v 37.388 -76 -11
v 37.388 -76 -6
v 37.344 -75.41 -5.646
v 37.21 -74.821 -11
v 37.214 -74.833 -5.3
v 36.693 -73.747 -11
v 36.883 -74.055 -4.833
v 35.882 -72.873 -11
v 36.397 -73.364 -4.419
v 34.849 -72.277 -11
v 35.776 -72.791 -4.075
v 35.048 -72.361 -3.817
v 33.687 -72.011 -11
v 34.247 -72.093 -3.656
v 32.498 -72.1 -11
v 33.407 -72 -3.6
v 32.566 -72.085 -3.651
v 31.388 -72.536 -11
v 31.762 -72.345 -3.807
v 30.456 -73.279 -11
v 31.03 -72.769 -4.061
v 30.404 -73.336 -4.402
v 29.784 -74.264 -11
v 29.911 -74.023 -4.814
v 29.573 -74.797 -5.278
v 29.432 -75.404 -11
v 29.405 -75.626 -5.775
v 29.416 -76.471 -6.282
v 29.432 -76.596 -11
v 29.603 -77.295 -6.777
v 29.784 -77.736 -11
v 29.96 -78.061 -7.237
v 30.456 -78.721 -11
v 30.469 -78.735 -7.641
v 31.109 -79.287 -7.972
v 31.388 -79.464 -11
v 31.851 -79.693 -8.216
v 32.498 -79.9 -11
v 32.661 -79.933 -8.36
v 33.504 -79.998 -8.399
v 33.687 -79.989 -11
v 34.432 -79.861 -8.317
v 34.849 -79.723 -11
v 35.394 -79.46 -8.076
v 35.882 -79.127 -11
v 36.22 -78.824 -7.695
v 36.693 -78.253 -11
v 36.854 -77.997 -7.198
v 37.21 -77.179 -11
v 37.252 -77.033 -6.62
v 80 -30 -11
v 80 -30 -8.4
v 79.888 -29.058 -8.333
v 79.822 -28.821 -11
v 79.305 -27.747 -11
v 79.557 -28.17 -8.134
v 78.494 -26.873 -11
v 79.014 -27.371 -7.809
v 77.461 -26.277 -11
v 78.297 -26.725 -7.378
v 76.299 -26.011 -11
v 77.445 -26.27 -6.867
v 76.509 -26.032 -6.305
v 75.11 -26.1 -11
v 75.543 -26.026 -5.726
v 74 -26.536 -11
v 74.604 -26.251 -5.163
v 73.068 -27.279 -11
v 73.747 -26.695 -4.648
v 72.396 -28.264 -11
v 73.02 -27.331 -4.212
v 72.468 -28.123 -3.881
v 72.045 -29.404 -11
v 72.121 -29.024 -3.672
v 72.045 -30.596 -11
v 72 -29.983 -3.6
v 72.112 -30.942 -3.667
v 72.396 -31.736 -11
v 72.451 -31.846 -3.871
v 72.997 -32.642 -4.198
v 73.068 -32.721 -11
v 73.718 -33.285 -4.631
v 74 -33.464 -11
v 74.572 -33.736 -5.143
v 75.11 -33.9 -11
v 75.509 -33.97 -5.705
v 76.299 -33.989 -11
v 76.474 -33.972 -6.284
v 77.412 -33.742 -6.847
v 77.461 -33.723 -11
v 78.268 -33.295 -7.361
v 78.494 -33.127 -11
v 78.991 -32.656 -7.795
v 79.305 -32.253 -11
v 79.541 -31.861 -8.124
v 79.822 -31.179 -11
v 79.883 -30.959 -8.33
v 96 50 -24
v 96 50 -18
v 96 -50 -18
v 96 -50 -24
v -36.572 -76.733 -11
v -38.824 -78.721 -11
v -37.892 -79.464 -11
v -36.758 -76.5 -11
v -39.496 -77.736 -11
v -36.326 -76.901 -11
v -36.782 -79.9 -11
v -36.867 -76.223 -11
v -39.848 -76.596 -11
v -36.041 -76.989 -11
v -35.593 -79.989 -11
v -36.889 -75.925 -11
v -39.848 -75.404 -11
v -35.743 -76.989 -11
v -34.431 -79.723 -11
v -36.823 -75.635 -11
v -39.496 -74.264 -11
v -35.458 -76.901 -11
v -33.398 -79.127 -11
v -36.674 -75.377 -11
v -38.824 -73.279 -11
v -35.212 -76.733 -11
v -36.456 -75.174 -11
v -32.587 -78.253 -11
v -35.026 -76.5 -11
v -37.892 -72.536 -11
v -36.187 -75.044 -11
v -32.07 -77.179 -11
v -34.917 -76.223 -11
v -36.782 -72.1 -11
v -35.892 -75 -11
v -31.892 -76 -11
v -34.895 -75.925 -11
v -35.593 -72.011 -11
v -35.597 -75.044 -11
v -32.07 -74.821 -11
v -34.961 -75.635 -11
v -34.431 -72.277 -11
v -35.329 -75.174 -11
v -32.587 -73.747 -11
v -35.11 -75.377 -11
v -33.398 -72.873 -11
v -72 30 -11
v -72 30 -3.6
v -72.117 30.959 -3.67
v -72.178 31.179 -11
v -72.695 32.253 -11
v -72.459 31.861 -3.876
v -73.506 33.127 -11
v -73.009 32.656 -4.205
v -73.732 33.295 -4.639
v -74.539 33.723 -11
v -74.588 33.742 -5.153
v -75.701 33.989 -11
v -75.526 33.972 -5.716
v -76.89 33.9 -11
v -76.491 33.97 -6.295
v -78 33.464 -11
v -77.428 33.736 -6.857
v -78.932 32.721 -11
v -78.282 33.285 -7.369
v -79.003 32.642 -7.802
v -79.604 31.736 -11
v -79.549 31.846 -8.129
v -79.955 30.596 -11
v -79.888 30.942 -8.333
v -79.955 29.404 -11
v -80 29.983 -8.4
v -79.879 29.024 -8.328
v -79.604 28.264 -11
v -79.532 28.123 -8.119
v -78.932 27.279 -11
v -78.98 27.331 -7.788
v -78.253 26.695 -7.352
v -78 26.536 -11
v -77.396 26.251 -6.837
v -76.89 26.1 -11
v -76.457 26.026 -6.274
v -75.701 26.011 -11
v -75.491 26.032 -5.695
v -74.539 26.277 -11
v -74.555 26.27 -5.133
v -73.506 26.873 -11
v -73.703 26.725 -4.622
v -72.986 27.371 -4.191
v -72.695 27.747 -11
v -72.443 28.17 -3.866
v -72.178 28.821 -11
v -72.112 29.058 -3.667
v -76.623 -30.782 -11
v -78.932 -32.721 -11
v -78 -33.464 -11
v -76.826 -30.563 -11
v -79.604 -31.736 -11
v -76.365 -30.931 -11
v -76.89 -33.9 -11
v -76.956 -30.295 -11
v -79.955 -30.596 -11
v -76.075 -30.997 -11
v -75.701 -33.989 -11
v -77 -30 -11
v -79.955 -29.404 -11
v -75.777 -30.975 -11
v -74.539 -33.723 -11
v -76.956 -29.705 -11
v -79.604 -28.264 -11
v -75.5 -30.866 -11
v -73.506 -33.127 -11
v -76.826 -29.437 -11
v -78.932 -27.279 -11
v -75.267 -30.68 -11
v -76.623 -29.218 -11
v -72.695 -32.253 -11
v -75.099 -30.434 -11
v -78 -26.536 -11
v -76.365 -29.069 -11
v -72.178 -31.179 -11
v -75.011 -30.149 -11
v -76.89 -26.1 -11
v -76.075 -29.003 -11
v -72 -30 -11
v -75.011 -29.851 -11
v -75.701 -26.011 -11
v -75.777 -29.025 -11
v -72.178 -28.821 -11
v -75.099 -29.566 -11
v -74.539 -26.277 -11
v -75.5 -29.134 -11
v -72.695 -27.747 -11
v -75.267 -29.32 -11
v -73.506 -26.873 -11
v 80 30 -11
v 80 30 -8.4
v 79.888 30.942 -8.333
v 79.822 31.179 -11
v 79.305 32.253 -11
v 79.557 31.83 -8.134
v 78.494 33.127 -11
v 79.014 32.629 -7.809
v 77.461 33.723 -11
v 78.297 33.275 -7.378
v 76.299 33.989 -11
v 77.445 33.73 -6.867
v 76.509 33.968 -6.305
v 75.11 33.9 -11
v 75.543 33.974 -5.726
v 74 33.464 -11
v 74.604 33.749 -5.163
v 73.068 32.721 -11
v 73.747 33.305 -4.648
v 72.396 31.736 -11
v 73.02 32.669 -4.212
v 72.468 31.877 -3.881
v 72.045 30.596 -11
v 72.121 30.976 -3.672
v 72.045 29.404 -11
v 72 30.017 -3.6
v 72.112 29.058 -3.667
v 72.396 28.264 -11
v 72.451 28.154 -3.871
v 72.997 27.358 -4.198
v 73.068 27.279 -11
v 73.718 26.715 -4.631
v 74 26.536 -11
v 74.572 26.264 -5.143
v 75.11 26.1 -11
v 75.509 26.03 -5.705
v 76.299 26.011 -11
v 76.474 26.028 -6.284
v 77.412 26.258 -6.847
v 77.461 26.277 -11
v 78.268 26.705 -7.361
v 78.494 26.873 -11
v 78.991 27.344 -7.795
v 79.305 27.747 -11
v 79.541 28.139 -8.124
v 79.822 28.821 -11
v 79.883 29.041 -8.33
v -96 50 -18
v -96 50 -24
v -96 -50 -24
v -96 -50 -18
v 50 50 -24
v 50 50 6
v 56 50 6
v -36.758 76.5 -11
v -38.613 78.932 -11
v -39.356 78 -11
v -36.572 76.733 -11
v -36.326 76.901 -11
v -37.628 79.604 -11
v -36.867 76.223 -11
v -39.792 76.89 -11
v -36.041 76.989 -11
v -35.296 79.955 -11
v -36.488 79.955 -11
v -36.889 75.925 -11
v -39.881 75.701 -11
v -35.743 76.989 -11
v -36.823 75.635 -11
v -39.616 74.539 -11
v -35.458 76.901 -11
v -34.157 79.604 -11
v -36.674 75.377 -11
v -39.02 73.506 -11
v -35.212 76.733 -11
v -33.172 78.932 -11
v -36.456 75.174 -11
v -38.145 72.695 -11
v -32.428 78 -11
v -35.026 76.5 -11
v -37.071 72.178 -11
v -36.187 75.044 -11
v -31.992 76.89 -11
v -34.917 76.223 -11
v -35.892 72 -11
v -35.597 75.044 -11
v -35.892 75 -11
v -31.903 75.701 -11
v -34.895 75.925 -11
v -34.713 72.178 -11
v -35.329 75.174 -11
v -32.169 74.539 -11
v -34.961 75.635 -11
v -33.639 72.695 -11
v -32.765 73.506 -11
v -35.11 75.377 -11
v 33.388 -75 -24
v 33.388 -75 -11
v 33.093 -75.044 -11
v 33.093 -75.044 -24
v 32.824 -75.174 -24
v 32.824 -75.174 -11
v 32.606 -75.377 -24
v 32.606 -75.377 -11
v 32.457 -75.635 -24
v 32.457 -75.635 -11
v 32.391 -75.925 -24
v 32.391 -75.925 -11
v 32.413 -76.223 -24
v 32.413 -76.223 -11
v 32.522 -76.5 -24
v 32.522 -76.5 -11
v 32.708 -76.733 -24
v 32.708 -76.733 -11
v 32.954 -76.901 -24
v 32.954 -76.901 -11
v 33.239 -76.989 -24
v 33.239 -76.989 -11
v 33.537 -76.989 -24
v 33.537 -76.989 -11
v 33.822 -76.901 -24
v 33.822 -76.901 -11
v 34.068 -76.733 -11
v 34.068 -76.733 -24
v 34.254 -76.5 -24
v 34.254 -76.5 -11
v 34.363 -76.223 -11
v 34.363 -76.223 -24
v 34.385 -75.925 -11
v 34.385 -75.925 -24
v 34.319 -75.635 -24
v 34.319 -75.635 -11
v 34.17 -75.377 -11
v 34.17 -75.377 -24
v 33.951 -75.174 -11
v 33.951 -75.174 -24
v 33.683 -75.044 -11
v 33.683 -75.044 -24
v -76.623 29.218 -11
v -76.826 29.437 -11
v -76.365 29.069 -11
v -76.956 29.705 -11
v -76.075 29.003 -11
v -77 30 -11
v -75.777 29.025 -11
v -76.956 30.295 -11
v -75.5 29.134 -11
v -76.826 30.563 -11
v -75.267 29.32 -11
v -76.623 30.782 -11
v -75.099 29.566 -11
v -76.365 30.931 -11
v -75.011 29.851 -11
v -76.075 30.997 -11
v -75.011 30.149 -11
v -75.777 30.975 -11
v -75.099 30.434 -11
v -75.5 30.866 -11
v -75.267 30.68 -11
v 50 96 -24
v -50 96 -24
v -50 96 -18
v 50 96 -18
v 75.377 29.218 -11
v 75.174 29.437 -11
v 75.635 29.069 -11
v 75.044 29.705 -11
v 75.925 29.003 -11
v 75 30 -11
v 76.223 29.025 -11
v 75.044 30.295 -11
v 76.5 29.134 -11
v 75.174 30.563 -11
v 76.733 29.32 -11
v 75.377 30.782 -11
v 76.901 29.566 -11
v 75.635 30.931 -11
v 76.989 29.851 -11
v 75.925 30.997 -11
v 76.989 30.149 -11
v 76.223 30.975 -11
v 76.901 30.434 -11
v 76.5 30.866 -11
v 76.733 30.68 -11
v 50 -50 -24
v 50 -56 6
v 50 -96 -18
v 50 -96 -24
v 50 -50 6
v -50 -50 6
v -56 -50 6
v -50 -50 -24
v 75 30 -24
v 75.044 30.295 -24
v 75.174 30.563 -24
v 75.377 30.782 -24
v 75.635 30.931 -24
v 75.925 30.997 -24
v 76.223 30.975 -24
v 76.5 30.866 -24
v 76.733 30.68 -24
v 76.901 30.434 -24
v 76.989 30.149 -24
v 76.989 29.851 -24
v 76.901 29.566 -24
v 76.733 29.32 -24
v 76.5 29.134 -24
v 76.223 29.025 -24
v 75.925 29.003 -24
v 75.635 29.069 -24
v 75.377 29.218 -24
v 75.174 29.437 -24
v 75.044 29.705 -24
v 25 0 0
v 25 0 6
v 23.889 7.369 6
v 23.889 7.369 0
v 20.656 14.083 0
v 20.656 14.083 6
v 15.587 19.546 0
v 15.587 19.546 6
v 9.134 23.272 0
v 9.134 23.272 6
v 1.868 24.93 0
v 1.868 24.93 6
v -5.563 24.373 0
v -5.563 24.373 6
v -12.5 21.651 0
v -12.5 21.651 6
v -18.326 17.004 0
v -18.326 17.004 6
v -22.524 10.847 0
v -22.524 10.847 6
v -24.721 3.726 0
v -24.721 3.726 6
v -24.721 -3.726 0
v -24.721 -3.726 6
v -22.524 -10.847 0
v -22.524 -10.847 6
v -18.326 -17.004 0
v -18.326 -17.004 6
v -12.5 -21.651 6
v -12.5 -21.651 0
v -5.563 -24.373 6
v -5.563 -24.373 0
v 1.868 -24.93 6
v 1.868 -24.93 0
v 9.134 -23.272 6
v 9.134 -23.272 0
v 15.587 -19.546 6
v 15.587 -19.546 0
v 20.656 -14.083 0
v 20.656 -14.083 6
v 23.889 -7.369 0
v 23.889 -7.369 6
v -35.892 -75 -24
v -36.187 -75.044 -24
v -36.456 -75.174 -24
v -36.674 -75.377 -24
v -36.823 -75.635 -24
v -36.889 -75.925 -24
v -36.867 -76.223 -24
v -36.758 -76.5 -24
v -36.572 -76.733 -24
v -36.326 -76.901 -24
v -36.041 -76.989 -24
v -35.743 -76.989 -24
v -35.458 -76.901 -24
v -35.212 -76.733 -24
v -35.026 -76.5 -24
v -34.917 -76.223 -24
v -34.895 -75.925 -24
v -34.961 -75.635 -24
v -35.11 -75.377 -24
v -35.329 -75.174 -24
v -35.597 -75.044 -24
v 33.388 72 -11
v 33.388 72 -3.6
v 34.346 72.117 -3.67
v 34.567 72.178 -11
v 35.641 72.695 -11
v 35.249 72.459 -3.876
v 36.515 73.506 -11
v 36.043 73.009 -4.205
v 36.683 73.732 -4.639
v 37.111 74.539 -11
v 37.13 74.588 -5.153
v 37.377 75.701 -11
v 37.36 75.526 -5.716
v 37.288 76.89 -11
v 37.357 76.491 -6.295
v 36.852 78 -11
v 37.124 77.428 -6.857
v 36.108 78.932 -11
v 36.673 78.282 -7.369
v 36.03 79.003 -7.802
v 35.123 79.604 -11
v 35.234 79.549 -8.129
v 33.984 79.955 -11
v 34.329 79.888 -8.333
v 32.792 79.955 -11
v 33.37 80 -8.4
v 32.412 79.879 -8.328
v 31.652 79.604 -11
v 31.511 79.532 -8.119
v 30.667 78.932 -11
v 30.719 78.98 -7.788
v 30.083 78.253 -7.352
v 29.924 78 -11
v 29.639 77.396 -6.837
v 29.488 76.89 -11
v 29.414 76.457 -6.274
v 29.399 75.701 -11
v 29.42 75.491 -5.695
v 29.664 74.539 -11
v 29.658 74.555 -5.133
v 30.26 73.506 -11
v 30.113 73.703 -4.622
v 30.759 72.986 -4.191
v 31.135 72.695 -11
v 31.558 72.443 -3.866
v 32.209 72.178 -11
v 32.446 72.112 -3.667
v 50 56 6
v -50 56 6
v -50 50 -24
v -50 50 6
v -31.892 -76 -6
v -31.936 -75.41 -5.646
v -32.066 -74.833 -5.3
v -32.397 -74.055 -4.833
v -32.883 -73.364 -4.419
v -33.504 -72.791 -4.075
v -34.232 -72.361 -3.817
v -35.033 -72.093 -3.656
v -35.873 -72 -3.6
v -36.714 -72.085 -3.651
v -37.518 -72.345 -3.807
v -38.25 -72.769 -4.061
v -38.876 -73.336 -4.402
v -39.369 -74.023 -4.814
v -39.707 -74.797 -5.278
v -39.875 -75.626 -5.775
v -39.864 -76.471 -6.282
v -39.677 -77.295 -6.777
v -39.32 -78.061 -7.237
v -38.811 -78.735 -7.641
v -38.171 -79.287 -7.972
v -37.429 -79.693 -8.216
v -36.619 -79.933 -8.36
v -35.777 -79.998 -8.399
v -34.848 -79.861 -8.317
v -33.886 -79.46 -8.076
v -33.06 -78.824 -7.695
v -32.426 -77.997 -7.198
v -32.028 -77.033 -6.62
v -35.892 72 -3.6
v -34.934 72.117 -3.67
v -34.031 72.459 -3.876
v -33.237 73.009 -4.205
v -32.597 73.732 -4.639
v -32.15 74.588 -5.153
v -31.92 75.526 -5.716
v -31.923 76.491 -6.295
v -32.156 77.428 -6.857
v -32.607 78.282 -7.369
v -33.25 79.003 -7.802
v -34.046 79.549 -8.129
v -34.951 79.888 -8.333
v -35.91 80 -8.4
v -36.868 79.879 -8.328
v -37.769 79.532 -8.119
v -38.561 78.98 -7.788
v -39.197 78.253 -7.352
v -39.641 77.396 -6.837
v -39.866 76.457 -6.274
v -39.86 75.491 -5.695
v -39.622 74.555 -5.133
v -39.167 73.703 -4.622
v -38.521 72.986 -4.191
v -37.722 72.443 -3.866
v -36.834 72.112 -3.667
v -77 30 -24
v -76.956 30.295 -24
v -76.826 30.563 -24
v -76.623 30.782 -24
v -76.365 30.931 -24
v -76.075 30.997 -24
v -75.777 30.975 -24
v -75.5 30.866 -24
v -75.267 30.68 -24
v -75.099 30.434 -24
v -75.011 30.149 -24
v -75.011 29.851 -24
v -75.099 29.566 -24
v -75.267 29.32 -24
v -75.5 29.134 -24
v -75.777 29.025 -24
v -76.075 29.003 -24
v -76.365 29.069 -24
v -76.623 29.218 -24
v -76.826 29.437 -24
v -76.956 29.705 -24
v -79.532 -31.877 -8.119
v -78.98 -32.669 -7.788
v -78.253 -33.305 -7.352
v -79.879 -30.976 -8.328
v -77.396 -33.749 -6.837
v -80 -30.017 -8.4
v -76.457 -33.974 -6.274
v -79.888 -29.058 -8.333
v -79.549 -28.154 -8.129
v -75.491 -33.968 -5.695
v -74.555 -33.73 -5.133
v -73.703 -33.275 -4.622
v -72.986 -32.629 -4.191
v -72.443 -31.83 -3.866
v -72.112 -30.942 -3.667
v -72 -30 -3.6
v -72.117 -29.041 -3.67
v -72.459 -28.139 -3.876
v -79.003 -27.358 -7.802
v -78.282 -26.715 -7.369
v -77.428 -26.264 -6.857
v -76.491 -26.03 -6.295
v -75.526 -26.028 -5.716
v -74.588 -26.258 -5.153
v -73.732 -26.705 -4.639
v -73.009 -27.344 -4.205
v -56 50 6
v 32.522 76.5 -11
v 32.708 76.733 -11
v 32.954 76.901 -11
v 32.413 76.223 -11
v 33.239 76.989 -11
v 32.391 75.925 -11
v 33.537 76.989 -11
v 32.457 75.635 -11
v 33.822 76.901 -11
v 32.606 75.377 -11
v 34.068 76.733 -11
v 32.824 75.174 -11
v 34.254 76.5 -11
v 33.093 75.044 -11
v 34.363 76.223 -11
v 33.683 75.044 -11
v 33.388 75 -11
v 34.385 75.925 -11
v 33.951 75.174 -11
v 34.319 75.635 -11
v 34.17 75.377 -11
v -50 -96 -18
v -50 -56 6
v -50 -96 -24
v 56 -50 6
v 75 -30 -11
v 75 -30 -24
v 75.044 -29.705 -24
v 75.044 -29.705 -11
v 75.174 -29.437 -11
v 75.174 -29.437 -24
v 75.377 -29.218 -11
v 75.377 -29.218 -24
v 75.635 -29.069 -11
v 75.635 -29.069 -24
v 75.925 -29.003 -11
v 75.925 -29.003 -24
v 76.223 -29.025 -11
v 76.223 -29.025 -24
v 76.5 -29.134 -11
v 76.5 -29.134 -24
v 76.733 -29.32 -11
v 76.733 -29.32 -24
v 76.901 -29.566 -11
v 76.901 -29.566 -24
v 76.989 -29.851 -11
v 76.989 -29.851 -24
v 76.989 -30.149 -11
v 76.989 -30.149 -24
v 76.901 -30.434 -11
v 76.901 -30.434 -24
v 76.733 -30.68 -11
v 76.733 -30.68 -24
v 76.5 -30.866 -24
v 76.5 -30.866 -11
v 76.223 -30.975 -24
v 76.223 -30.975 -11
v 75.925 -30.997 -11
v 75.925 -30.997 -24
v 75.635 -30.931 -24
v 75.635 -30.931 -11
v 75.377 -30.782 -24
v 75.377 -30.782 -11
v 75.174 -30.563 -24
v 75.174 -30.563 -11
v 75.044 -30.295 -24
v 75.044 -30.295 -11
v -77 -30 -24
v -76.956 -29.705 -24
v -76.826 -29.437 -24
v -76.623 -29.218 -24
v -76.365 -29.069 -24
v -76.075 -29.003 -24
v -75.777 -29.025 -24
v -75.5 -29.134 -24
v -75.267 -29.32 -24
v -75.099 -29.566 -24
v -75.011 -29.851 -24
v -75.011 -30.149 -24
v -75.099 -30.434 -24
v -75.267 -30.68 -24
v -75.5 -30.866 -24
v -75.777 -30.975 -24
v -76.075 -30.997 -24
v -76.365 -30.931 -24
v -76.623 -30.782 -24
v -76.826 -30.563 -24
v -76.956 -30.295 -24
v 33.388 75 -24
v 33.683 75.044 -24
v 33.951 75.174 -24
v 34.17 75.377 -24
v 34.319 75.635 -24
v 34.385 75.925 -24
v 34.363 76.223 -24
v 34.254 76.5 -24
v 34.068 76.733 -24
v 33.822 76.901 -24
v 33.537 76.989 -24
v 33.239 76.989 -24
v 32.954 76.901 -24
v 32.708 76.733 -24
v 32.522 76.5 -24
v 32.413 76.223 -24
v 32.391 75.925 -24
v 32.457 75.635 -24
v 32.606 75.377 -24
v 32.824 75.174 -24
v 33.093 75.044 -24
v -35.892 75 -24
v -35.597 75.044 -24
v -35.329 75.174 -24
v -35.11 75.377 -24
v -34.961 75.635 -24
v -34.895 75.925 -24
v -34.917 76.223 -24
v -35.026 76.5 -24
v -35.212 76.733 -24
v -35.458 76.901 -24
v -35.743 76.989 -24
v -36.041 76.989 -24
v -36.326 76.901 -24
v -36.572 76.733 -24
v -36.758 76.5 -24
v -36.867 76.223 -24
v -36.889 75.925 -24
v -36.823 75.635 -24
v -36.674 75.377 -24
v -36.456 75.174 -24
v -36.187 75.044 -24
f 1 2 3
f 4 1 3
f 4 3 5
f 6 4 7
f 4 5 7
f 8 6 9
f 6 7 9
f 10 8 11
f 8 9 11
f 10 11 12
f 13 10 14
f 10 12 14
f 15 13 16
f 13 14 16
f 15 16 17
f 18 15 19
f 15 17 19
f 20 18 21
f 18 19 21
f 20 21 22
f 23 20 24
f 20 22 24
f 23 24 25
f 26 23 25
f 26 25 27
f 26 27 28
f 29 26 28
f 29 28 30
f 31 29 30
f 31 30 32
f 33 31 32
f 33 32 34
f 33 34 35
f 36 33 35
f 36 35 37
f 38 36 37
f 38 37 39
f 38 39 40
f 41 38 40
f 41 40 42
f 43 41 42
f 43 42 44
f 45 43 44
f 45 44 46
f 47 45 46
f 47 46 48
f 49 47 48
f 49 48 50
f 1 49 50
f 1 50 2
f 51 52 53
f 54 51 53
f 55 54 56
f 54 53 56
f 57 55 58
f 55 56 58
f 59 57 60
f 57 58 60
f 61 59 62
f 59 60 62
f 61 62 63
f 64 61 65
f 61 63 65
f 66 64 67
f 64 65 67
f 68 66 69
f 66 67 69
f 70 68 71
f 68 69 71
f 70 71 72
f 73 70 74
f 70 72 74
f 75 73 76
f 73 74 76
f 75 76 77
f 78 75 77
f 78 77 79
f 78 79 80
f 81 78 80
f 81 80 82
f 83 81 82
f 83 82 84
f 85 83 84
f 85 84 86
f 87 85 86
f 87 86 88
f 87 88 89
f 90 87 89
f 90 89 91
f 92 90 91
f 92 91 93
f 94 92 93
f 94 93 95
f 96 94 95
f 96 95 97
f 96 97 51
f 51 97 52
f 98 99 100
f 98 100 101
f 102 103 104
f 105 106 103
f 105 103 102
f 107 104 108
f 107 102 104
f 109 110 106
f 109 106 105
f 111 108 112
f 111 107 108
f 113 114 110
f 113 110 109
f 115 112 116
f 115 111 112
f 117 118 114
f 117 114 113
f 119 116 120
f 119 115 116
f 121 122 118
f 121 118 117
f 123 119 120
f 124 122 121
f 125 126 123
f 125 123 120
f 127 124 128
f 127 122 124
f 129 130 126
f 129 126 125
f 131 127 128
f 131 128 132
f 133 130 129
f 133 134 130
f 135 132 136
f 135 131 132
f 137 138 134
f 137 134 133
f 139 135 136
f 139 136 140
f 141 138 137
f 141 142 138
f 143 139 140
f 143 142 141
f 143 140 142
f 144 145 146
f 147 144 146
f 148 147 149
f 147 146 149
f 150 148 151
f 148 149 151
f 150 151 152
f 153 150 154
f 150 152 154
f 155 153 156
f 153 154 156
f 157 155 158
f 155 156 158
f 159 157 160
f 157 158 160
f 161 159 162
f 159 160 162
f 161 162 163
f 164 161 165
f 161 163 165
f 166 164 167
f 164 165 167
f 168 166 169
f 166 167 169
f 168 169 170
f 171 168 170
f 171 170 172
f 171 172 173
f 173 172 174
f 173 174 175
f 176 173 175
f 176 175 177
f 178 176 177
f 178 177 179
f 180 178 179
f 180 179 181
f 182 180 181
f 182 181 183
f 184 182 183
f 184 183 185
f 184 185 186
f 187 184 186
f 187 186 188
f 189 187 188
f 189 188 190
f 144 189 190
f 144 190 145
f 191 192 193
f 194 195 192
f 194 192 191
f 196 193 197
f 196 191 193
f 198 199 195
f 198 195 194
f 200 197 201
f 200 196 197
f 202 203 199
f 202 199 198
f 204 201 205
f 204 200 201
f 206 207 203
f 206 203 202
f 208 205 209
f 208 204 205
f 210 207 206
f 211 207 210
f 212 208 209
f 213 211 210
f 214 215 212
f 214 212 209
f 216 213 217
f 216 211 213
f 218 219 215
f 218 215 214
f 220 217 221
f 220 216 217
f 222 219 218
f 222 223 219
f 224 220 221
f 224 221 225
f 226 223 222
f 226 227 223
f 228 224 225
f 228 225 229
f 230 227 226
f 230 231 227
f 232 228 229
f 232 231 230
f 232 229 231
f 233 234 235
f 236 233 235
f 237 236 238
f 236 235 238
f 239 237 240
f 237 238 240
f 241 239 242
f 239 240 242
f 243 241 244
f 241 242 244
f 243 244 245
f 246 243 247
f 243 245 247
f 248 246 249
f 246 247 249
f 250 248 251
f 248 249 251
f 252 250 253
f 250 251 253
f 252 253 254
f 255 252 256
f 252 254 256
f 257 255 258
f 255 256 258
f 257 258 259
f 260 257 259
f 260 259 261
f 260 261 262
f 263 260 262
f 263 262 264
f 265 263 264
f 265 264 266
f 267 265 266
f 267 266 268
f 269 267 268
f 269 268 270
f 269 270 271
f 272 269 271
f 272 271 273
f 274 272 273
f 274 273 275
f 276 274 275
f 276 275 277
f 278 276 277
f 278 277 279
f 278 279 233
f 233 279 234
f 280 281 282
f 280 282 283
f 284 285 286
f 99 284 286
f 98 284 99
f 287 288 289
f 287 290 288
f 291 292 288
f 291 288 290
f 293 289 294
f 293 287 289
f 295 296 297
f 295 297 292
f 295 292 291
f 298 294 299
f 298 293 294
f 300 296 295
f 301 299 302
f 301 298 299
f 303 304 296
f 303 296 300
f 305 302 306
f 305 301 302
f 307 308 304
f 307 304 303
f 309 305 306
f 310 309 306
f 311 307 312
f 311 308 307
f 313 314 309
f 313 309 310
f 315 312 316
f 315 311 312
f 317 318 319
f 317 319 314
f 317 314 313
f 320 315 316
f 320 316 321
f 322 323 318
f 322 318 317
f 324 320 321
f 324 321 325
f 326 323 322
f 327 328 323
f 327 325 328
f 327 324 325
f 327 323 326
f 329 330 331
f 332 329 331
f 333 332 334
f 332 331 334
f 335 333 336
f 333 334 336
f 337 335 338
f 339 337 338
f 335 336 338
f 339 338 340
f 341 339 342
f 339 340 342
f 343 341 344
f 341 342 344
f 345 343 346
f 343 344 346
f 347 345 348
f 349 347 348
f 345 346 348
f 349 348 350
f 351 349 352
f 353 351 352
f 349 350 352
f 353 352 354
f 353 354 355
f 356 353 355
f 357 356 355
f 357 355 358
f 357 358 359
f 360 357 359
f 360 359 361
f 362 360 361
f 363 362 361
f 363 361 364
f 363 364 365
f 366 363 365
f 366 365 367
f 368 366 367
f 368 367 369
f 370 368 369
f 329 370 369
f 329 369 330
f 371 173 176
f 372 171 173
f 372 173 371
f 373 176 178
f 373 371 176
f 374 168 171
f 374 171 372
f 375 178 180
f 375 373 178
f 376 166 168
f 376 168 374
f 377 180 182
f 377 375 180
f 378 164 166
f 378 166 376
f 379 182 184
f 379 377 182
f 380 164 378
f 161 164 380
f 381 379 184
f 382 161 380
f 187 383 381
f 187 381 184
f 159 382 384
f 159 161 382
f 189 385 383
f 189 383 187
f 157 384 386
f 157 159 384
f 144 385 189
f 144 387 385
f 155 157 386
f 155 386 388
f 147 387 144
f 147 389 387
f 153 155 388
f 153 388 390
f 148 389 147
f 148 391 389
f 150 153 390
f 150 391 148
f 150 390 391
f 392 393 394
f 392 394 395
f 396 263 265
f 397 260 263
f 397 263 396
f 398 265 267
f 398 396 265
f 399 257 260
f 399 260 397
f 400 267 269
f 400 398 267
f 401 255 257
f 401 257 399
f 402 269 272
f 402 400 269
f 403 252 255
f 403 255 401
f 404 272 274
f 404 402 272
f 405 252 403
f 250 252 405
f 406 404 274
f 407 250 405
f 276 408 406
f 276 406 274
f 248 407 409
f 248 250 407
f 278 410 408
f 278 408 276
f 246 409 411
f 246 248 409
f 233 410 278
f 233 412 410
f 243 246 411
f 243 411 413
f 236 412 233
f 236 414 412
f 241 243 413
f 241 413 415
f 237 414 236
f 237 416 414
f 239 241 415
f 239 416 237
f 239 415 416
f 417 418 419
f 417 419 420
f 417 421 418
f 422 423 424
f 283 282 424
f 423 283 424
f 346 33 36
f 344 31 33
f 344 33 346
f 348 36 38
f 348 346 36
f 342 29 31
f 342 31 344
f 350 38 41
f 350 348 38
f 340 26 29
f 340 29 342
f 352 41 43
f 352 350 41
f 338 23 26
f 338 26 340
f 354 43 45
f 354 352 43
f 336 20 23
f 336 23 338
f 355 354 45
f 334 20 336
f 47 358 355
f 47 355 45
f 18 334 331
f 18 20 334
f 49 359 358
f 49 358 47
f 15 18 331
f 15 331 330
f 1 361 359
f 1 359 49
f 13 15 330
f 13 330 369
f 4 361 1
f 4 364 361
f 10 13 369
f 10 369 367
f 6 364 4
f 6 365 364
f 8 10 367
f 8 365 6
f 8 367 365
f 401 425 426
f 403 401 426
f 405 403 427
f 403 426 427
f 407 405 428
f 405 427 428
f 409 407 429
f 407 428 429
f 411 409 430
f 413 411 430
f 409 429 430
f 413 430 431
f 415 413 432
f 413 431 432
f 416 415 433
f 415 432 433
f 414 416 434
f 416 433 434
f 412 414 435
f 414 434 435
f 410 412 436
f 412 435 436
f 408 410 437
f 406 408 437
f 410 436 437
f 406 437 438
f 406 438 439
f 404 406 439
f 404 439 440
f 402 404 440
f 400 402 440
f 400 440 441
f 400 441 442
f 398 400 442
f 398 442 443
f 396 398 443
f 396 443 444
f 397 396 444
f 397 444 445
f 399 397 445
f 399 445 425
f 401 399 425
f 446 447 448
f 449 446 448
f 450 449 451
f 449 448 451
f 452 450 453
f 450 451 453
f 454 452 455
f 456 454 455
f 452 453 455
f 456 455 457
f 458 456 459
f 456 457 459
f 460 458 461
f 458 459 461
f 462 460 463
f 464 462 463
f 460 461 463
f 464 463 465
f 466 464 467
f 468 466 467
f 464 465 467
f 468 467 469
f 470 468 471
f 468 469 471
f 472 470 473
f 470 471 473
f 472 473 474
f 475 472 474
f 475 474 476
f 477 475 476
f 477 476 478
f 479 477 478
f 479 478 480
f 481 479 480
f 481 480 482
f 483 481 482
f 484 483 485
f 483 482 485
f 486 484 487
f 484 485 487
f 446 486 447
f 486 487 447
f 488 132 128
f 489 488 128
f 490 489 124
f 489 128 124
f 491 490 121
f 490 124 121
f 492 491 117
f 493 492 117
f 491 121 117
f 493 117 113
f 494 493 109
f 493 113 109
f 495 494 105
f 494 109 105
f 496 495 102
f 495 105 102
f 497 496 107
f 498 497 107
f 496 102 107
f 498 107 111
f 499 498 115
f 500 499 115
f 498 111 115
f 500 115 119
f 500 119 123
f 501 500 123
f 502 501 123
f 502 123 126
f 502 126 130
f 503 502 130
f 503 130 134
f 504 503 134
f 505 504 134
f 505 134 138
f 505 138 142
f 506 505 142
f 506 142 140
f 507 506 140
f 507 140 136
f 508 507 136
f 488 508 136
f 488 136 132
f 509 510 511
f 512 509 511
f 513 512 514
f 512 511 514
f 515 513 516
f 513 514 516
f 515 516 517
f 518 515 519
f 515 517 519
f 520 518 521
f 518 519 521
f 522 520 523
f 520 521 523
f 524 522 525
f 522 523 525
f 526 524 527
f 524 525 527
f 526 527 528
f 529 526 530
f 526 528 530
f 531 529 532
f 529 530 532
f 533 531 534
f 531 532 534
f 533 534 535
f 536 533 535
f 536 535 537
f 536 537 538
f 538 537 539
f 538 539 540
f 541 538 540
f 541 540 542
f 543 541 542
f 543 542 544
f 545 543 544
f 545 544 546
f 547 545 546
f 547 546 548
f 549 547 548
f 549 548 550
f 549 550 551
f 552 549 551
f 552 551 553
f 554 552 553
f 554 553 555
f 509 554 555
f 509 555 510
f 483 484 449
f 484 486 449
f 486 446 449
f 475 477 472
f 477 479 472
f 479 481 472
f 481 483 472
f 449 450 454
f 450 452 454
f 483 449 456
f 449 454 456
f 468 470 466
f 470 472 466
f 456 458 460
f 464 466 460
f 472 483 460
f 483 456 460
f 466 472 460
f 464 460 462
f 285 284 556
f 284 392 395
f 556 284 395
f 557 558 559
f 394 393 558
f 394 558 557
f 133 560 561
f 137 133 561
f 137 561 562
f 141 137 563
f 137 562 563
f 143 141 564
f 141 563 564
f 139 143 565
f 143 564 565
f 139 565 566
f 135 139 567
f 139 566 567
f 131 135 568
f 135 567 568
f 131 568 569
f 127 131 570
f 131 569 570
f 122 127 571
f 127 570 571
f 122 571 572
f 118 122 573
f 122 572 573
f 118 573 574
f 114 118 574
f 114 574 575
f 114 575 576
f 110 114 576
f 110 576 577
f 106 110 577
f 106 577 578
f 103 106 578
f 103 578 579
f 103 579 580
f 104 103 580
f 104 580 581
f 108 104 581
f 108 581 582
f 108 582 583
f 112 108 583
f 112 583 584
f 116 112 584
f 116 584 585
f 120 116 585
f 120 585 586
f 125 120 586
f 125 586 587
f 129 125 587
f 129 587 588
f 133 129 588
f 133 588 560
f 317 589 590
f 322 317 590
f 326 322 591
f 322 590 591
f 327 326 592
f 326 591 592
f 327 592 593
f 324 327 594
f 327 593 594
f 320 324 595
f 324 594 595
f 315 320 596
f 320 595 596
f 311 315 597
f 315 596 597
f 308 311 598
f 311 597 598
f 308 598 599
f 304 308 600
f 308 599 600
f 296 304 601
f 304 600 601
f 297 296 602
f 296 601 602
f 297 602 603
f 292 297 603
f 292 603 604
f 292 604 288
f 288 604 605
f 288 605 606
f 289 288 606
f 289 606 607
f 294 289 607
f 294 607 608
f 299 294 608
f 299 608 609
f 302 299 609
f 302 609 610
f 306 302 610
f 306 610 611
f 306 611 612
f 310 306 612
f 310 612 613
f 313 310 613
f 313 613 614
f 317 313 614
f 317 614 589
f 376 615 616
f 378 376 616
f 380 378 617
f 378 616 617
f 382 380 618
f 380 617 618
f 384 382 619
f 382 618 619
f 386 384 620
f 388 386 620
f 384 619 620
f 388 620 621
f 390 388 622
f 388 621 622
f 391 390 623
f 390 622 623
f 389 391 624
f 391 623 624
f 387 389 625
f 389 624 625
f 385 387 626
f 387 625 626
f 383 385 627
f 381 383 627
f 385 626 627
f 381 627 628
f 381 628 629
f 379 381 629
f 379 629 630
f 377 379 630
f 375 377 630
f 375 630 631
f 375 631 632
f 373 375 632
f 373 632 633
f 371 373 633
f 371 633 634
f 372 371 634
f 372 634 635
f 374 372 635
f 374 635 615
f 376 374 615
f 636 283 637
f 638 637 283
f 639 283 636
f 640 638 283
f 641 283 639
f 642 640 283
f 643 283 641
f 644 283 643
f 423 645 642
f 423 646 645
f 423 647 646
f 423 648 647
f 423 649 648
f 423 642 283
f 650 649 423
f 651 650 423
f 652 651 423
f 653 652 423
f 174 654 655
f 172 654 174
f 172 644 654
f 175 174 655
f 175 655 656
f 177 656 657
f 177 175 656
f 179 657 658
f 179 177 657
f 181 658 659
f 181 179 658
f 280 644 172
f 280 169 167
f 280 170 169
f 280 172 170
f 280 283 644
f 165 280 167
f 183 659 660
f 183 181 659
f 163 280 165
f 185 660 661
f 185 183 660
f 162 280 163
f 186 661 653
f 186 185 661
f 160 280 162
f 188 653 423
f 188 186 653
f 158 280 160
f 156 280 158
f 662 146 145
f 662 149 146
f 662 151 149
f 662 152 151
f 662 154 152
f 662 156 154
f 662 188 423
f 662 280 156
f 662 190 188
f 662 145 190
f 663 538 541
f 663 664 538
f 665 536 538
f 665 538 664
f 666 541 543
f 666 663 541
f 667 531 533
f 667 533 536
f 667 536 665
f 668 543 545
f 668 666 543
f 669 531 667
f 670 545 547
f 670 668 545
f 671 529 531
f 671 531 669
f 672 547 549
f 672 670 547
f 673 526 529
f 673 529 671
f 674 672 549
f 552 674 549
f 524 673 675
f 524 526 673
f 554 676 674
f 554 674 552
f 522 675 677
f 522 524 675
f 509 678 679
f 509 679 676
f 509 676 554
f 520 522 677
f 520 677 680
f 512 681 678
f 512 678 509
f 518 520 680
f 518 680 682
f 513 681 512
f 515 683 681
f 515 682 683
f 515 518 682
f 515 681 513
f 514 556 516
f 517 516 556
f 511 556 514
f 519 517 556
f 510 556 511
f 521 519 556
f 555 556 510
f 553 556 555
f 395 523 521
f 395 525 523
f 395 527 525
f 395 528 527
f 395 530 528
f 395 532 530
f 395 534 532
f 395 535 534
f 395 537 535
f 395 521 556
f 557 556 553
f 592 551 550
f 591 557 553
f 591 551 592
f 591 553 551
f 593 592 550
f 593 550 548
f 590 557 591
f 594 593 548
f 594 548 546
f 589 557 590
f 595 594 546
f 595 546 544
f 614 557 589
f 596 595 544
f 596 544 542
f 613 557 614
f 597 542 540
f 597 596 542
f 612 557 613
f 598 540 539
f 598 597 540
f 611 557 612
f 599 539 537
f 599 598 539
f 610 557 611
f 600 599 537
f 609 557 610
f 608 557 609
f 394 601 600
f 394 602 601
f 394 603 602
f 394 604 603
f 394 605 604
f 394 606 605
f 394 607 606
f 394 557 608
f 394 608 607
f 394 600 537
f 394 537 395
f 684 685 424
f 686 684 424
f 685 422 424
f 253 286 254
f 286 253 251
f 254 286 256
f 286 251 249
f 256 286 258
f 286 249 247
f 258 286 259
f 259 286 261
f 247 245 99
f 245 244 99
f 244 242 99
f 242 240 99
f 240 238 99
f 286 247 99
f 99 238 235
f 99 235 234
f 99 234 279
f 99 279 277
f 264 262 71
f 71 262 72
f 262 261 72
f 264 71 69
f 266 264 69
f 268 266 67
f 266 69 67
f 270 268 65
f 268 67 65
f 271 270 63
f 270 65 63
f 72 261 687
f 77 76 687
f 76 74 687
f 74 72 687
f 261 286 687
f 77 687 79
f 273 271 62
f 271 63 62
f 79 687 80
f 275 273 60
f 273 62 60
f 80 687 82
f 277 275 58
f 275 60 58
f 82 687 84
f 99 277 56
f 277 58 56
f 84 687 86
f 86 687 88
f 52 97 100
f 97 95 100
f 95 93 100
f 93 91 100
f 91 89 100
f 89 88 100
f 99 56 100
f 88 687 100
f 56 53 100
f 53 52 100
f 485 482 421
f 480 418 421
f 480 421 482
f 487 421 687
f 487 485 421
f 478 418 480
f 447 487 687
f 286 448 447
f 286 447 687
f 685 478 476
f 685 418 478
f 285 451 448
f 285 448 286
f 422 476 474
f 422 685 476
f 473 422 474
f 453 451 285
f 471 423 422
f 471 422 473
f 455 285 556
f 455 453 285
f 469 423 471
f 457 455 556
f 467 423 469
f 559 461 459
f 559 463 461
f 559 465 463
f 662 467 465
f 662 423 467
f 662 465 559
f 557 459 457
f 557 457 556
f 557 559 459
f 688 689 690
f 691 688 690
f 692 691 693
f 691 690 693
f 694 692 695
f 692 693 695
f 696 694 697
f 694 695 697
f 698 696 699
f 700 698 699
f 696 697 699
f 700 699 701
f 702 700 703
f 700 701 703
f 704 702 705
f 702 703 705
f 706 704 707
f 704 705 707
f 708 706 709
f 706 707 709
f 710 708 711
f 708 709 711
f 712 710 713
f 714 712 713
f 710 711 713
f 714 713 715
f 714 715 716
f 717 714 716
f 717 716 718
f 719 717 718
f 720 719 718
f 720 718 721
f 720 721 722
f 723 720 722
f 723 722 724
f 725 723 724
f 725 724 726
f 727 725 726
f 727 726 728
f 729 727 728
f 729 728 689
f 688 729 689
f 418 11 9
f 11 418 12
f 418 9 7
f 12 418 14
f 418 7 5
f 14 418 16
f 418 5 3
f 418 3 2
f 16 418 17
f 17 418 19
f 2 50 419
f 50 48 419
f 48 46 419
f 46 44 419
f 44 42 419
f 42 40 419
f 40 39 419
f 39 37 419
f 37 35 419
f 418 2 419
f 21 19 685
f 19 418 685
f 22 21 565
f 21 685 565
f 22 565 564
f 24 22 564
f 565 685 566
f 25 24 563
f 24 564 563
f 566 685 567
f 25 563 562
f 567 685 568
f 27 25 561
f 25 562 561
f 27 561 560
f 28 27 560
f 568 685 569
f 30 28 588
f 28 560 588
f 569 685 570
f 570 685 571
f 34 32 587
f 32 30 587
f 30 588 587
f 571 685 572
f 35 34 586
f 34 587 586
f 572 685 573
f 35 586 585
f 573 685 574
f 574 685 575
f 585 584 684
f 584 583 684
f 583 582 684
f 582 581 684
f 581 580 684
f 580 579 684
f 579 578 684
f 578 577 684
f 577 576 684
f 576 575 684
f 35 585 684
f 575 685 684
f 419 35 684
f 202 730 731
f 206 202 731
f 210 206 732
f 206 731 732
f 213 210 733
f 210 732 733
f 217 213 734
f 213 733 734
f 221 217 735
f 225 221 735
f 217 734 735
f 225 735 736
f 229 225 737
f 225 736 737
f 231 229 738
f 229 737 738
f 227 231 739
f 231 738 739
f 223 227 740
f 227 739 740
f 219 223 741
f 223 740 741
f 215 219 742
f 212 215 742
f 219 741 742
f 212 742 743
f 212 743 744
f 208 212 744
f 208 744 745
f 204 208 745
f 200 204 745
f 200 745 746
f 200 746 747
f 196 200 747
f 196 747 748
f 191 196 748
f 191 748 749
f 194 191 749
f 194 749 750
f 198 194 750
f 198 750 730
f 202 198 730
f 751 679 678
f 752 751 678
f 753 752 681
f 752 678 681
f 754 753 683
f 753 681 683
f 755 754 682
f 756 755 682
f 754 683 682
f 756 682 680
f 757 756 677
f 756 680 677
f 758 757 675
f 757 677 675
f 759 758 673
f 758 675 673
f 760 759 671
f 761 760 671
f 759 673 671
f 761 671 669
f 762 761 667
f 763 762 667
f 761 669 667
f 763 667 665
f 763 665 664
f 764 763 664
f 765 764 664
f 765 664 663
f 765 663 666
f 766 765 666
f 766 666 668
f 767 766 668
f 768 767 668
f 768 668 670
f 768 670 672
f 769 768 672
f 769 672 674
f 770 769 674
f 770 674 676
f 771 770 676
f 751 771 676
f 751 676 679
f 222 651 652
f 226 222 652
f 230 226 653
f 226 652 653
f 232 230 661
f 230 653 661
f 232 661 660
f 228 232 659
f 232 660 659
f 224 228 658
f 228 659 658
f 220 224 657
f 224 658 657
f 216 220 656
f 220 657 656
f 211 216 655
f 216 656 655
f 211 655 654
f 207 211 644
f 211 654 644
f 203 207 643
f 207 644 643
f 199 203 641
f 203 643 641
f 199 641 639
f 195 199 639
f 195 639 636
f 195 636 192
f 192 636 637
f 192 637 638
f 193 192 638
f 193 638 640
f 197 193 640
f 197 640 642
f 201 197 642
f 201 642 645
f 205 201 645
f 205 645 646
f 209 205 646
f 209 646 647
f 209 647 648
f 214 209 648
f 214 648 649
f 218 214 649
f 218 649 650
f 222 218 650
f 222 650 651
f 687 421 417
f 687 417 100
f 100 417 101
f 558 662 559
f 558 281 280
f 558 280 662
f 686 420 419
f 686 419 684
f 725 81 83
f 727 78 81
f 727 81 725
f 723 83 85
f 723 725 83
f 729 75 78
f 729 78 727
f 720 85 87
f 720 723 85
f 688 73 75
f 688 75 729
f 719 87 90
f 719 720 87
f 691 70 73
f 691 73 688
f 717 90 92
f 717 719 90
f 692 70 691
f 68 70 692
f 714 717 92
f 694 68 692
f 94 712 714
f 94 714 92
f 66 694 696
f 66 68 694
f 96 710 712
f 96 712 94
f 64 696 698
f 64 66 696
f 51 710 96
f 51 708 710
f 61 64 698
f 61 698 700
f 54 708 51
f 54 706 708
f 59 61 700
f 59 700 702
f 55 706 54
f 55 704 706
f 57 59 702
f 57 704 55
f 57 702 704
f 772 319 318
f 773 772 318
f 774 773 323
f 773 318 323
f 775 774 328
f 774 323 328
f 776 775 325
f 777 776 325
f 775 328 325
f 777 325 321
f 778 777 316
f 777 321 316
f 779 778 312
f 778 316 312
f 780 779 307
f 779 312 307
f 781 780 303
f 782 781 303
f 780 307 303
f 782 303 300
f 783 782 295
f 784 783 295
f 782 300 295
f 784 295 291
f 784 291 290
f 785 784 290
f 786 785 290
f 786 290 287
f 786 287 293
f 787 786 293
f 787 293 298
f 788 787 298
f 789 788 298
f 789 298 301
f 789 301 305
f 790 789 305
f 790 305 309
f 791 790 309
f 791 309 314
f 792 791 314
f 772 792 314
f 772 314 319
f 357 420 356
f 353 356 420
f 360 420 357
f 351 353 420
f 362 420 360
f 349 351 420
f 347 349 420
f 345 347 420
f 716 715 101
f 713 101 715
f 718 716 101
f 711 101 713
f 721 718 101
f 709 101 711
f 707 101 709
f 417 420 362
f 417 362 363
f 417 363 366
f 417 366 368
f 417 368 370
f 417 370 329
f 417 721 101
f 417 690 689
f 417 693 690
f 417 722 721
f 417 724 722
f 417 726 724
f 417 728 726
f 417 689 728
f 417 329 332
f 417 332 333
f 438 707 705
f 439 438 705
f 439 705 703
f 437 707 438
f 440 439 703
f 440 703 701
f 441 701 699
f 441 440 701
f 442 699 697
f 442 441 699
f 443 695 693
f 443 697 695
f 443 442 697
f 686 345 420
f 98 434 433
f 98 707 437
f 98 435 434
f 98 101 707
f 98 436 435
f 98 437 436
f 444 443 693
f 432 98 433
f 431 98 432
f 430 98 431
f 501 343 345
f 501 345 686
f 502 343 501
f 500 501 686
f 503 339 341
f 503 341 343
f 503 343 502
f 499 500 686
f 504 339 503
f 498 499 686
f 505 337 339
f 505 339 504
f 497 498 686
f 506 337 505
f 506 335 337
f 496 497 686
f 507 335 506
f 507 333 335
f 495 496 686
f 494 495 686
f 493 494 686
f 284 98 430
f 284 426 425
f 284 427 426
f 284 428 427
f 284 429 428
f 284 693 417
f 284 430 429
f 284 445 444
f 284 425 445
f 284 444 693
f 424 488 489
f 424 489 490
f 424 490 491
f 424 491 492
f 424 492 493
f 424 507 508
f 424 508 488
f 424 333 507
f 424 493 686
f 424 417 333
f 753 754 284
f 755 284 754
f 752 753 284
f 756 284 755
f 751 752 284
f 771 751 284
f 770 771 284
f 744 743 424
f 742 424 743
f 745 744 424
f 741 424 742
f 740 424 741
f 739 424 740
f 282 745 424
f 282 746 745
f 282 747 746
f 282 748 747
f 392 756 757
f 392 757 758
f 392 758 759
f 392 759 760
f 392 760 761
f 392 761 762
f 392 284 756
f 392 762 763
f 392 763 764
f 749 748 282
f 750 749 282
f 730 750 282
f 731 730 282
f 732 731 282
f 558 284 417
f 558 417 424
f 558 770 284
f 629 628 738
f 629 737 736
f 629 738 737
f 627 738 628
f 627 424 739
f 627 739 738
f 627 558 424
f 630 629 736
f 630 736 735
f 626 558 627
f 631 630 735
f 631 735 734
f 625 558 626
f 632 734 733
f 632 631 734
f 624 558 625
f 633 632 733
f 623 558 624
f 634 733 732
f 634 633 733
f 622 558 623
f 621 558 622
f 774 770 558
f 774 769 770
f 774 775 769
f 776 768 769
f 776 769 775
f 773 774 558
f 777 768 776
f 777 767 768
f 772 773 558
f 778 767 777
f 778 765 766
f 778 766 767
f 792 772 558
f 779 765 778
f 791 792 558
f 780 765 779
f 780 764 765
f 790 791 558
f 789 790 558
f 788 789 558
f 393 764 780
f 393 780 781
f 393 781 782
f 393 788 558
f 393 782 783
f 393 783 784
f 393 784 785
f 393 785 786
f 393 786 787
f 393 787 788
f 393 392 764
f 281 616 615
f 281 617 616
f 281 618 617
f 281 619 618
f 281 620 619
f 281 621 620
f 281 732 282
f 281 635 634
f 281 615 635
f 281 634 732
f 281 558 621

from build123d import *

# Parameters (mm, degrees)
ESQUISSE1_W              = 100
ESQUISSE1_H              = 100
BOSS_EXTRU_1_DEPTH       = 6
ESQUISSE2_W              = 30
ESQUISSE2_H              = 100
BOSS_EXTRU_2_DEPTH       = 6
ESQUISSE3_W              = 30
ESQUISSE3_H              = 100
BOSS_EXTRU_3_DEPTH       = 6
ESQUISSE4_W              = 6
ESQUISSE4_H              = 100
BOSS_EXTRU_4_DEPTH       = 40
ESQUISSE5_W              = 6
ESQUISSE5_H              = 100
BOSS_EXTRU_5_DEPTH       = 40
BOSS_EXTRU_7_DEPTH       = 100
BOSS_EXTRU_8_DEPTH       = 100
ESQUISSE9_R              = 1
ENL_V_MAT_EXTRU_1_DEPTH  = 60
ESQUISSE10_R             = 4
ENL_V_MAT_EXTRU_2_DEPTH  = 17
BOSS_EXTRU_27_DEPTH      = 6
BOSS_EXTRU_27_DEPTH_BACK = 3
ESQUISSE28_W             = 100
ESQUISSE28_H             = 30
ESQUISSE29_W             = 100
ESQUISSE29_H             = 6
BOSS_EXTRU_28_DEPTH      = 40
BOSS_EXTRU_30_DEPTH      = 6
BOSS_EXTRU_30_DEPTH_BACK = 3
ESQUISSE30_W             = 100
ESQUISSE30_H             = 30
ESQUISSE31_W             = 100
ESQUISSE31_H             = 6
BOSS_EXTRU_31_DEPTH      = 40
BOSS_EXTRU_32_DEPTH      = 100
BOSS_EXTRU_33_DEPTH      = 100
ESQUISSE34_R             = 1
ENL_V_MAT_EXTRU_7_DEPTH  = 100
ESQUISSE35_R             = 4
ENL_V_MAT_EXTRU_8_DEPTH  = 17
ESQUISSE36_R             = 25
ENL_V_MAT_EXTRU_9_DEPTH  = 6
ESQUISSE37_W             = 100
ESQUISSE37_H             = 94.110781927
BOSS_EXTRU_34_DEPTH      = 24


with BuildPart() as part:
    # Esquisse1 → Boss.-Extru.1 (new body)
    with BuildSketch(Plane.XY):
        Rectangle(ESQUISSE1_W, ESQUISSE1_H)
    extrude(amount=BOSS_EXTRU_1_DEPTH)

    # Esquisse2 → Boss.-Extru.2 (add)
    with BuildSketch(Plane.ZY.offset(50)):
        with Locations((-9, 0)):
            Rectangle(ESQUISSE2_W, ESQUISSE2_H)
    extrude(amount=BOSS_EXTRU_2_DEPTH)

    # Esquisse3 → Boss.-Extru.3 (add)
    with BuildSketch(Plane(origin=(50, 0, 0), x_dir=(0, 0, -1), z_dir=(1, 0, 0))):
        with Locations((9, 0)):
            Rectangle(ESQUISSE3_W, ESQUISSE3_H)
    extrude(amount=BOSS_EXTRU_3_DEPTH)

    # Esquisse4 → Boss.-Extru.4 (add)
    with BuildSketch(Plane(origin=(56, 0, 0), x_dir=(0, 0, -1), z_dir=(1, 0, 0))):
        with Locations((21, 0)):
            Rectangle(ESQUISSE4_W, ESQUISSE4_H)
    extrude(amount=BOSS_EXTRU_4_DEPTH)

    # Esquisse5 → Boss.-Extru.5 (add)
    with BuildSketch(Plane.ZY.offset(56)):
        with Locations((-21, 0)):
            Rectangle(ESQUISSE5_W, ESQUISSE5_H)
    extrude(amount=BOSS_EXTRU_5_DEPTH)

    # Esquisse6 → Boss.-Extru.7 (add)
    with BuildSketch(Plane(origin=(0, 50, 0), x_dir=(1, 0, 0), z_dir=(0, 1, 0))):
        Polygon((-56, -6), (-56, 18), (-96, 18), align=None)
    extrude(amount=-BOSS_EXTRU_7_DEPTH)

    # Esquisse8 → Boss.-Extru.8 (add)
    with BuildSketch(Plane(origin=(0, -50, 0), x_dir=(-1, 0, 0), z_dir=(0, -1, 0))):
        Polygon((-56, -6), (-96, 18), (-56, 18), align=None)
    extrude(amount=-BOSS_EXTRU_8_DEPTH)

    # Esquisse9 → Enlèv. mat.-Extru.1 (cut)
    with BuildSketch(Plane(origin=(0, 0, -24), x_dir=(-1, 0, 0), z_dir=(0, 0, -1))):
        with Locations((-76, 30)):
            Circle(ESQUISSE9_R)
        with Locations((-76, -30)):
            Circle(ESQUISSE9_R)
        with Locations((76, -30)):
            Circle(ESQUISSE9_R)
        with Locations((76, 30)):
            Circle(ESQUISSE9_R)
    extrude(amount=-ENL_V_MAT_EXTRU_1_DEPTH, mode=Mode.SUBTRACT)

    # Esquisse10 → Enlèv. mat.-Extru.2 (cut)
    with BuildSketch(Plane.XY.offset(6)):
        with Locations((76, 30)):
            Circle(ESQUISSE10_R)
        with Locations((76, -30)):
            Circle(ESQUISSE10_R)
        with Locations((-76, -30)):
            Circle(ESQUISSE10_R)
        with Locations((-76, 30)):
            Circle(ESQUISSE10_R)
    extrude(amount=-ENL_V_MAT_EXTRU_2_DEPTH, mode=Mode.SUBTRACT)

    # Esquisse28 → Boss.-Extru.27 (add, two sides: drawn at the far end of the back side and taken through both)
    with BuildSketch(Plane(origin=(0, -50, 0), x_dir=(-1, 0, 0), z_dir=(0, -1, 0)).offset(-BOSS_EXTRU_27_DEPTH_BACK)):
        with Locations((0, 9)):
            Rectangle(ESQUISSE28_W, ESQUISSE28_H)
    extrude(amount=BOSS_EXTRU_27_DEPTH + BOSS_EXTRU_27_DEPTH_BACK)

    # Esquisse29 → Boss.-Extru.28 (add)
    with BuildSketch(Plane(origin=(0, -56, 0), x_dir=(-1, 0, 0), z_dir=(0, -1, 0))):
        with Locations((0, 21)):
            Rectangle(ESQUISSE29_W, ESQUISSE29_H)
    extrude(amount=BOSS_EXTRU_28_DEPTH)

    # Esquisse30 → Boss.-Extru.30 (add, two sides: drawn at the far end of the back side and taken through both)
    with BuildSketch(Plane(origin=(0, 50, 0), x_dir=(1, 0, 0), z_dir=(0, 1, 0)).offset(-BOSS_EXTRU_30_DEPTH_BACK)):
        with Locations((0, 9)):
            Rectangle(ESQUISSE30_W, ESQUISSE30_H)
    extrude(amount=BOSS_EXTRU_30_DEPTH + BOSS_EXTRU_30_DEPTH_BACK)

    # Esquisse31 → Boss.-Extru.31 (add)
    with BuildSketch(Plane(origin=(0, 56, 0), x_dir=(1, 0, 0), z_dir=(0, 1, 0))):
        with Locations((0, 21)):
            Rectangle(ESQUISSE31_W, ESQUISSE31_H)
    extrude(amount=BOSS_EXTRU_31_DEPTH)

    # Esquisse32 → Boss.-Extru.32 (add)
    with BuildSketch(Plane.ZY.offset(50)):
        Polygon((-18, -56), (6, -56), (-18, -96), align=None)
    extrude(amount=-BOSS_EXTRU_32_DEPTH)

    # Esquisse33 → Boss.-Extru.33 (add)
    with BuildSketch(Plane.ZY.offset(50)):
        Polygon((-18, 56), (6, 56), (-18, 96), align=None)
    extrude(amount=-BOSS_EXTRU_33_DEPTH)

    # Esquisse34 → Enlèv. mat.-Extru.7 (cut)
    with BuildSketch(Plane.XY.offset(6)):
        with Locations(Location((-35.892206296, -76, 0), (0, 0, 90))):
            Circle(ESQUISSE34_R)
        with Locations(Location((33.387808828, -76, 0), (0, 0, 90))):
            Circle(ESQUISSE34_R)
        with Locations(Location((33.387808828, 76, 0), (0, 0, 270))):
            Circle(ESQUISSE34_R)
        with Locations(Location((-35.892206296, 76, 0), (0, 0, 270))):
            Circle(ESQUISSE34_R)
    extrude(amount=-ENL_V_MAT_EXTRU_7_DEPTH, mode=Mode.SUBTRACT)

    # Esquisse35 → Enlèv. mat.-Extru.8 (cut)
    with BuildSketch(Plane.XY.offset(6)):
        with Locations((33.387808828, -76)):
            Circle(ESQUISSE35_R)
        with Locations((-35.892206296, -76)):
            Circle(ESQUISSE35_R)
        with Locations(Location((-35.892206296, 76, 0), (0, 0, 270))):
            Circle(ESQUISSE35_R)
        with Locations(Location((33.387808828, 76, 0), (0, 0, 270))):
            Circle(ESQUISSE35_R)
    extrude(amount=-ENL_V_MAT_EXTRU_8_DEPTH, mode=Mode.SUBTRACT)

    # Esquisse36 → Enlèv. mat.-Extru.9 (cut)
    with BuildSketch(Plane.XY.offset(6)):
        Circle(ESQUISSE36_R)
    extrude(amount=-ENL_V_MAT_EXTRU_9_DEPTH, mode=Mode.SUBTRACT)

    # Esquisse37 → Boss.-Extru.34 (add)
    with BuildSketch(Plane(origin=(0, 0, -24), x_dir=(-1, 0, 0), z_dir=(0, 0, -1))):
        with Locations((0, 0.055390964)):
            Rectangle(ESQUISSE37_W, ESQUISSE37_H)
    extrude(amount=-BOSS_EXTRU_34_DEPTH)


solid = part.part
